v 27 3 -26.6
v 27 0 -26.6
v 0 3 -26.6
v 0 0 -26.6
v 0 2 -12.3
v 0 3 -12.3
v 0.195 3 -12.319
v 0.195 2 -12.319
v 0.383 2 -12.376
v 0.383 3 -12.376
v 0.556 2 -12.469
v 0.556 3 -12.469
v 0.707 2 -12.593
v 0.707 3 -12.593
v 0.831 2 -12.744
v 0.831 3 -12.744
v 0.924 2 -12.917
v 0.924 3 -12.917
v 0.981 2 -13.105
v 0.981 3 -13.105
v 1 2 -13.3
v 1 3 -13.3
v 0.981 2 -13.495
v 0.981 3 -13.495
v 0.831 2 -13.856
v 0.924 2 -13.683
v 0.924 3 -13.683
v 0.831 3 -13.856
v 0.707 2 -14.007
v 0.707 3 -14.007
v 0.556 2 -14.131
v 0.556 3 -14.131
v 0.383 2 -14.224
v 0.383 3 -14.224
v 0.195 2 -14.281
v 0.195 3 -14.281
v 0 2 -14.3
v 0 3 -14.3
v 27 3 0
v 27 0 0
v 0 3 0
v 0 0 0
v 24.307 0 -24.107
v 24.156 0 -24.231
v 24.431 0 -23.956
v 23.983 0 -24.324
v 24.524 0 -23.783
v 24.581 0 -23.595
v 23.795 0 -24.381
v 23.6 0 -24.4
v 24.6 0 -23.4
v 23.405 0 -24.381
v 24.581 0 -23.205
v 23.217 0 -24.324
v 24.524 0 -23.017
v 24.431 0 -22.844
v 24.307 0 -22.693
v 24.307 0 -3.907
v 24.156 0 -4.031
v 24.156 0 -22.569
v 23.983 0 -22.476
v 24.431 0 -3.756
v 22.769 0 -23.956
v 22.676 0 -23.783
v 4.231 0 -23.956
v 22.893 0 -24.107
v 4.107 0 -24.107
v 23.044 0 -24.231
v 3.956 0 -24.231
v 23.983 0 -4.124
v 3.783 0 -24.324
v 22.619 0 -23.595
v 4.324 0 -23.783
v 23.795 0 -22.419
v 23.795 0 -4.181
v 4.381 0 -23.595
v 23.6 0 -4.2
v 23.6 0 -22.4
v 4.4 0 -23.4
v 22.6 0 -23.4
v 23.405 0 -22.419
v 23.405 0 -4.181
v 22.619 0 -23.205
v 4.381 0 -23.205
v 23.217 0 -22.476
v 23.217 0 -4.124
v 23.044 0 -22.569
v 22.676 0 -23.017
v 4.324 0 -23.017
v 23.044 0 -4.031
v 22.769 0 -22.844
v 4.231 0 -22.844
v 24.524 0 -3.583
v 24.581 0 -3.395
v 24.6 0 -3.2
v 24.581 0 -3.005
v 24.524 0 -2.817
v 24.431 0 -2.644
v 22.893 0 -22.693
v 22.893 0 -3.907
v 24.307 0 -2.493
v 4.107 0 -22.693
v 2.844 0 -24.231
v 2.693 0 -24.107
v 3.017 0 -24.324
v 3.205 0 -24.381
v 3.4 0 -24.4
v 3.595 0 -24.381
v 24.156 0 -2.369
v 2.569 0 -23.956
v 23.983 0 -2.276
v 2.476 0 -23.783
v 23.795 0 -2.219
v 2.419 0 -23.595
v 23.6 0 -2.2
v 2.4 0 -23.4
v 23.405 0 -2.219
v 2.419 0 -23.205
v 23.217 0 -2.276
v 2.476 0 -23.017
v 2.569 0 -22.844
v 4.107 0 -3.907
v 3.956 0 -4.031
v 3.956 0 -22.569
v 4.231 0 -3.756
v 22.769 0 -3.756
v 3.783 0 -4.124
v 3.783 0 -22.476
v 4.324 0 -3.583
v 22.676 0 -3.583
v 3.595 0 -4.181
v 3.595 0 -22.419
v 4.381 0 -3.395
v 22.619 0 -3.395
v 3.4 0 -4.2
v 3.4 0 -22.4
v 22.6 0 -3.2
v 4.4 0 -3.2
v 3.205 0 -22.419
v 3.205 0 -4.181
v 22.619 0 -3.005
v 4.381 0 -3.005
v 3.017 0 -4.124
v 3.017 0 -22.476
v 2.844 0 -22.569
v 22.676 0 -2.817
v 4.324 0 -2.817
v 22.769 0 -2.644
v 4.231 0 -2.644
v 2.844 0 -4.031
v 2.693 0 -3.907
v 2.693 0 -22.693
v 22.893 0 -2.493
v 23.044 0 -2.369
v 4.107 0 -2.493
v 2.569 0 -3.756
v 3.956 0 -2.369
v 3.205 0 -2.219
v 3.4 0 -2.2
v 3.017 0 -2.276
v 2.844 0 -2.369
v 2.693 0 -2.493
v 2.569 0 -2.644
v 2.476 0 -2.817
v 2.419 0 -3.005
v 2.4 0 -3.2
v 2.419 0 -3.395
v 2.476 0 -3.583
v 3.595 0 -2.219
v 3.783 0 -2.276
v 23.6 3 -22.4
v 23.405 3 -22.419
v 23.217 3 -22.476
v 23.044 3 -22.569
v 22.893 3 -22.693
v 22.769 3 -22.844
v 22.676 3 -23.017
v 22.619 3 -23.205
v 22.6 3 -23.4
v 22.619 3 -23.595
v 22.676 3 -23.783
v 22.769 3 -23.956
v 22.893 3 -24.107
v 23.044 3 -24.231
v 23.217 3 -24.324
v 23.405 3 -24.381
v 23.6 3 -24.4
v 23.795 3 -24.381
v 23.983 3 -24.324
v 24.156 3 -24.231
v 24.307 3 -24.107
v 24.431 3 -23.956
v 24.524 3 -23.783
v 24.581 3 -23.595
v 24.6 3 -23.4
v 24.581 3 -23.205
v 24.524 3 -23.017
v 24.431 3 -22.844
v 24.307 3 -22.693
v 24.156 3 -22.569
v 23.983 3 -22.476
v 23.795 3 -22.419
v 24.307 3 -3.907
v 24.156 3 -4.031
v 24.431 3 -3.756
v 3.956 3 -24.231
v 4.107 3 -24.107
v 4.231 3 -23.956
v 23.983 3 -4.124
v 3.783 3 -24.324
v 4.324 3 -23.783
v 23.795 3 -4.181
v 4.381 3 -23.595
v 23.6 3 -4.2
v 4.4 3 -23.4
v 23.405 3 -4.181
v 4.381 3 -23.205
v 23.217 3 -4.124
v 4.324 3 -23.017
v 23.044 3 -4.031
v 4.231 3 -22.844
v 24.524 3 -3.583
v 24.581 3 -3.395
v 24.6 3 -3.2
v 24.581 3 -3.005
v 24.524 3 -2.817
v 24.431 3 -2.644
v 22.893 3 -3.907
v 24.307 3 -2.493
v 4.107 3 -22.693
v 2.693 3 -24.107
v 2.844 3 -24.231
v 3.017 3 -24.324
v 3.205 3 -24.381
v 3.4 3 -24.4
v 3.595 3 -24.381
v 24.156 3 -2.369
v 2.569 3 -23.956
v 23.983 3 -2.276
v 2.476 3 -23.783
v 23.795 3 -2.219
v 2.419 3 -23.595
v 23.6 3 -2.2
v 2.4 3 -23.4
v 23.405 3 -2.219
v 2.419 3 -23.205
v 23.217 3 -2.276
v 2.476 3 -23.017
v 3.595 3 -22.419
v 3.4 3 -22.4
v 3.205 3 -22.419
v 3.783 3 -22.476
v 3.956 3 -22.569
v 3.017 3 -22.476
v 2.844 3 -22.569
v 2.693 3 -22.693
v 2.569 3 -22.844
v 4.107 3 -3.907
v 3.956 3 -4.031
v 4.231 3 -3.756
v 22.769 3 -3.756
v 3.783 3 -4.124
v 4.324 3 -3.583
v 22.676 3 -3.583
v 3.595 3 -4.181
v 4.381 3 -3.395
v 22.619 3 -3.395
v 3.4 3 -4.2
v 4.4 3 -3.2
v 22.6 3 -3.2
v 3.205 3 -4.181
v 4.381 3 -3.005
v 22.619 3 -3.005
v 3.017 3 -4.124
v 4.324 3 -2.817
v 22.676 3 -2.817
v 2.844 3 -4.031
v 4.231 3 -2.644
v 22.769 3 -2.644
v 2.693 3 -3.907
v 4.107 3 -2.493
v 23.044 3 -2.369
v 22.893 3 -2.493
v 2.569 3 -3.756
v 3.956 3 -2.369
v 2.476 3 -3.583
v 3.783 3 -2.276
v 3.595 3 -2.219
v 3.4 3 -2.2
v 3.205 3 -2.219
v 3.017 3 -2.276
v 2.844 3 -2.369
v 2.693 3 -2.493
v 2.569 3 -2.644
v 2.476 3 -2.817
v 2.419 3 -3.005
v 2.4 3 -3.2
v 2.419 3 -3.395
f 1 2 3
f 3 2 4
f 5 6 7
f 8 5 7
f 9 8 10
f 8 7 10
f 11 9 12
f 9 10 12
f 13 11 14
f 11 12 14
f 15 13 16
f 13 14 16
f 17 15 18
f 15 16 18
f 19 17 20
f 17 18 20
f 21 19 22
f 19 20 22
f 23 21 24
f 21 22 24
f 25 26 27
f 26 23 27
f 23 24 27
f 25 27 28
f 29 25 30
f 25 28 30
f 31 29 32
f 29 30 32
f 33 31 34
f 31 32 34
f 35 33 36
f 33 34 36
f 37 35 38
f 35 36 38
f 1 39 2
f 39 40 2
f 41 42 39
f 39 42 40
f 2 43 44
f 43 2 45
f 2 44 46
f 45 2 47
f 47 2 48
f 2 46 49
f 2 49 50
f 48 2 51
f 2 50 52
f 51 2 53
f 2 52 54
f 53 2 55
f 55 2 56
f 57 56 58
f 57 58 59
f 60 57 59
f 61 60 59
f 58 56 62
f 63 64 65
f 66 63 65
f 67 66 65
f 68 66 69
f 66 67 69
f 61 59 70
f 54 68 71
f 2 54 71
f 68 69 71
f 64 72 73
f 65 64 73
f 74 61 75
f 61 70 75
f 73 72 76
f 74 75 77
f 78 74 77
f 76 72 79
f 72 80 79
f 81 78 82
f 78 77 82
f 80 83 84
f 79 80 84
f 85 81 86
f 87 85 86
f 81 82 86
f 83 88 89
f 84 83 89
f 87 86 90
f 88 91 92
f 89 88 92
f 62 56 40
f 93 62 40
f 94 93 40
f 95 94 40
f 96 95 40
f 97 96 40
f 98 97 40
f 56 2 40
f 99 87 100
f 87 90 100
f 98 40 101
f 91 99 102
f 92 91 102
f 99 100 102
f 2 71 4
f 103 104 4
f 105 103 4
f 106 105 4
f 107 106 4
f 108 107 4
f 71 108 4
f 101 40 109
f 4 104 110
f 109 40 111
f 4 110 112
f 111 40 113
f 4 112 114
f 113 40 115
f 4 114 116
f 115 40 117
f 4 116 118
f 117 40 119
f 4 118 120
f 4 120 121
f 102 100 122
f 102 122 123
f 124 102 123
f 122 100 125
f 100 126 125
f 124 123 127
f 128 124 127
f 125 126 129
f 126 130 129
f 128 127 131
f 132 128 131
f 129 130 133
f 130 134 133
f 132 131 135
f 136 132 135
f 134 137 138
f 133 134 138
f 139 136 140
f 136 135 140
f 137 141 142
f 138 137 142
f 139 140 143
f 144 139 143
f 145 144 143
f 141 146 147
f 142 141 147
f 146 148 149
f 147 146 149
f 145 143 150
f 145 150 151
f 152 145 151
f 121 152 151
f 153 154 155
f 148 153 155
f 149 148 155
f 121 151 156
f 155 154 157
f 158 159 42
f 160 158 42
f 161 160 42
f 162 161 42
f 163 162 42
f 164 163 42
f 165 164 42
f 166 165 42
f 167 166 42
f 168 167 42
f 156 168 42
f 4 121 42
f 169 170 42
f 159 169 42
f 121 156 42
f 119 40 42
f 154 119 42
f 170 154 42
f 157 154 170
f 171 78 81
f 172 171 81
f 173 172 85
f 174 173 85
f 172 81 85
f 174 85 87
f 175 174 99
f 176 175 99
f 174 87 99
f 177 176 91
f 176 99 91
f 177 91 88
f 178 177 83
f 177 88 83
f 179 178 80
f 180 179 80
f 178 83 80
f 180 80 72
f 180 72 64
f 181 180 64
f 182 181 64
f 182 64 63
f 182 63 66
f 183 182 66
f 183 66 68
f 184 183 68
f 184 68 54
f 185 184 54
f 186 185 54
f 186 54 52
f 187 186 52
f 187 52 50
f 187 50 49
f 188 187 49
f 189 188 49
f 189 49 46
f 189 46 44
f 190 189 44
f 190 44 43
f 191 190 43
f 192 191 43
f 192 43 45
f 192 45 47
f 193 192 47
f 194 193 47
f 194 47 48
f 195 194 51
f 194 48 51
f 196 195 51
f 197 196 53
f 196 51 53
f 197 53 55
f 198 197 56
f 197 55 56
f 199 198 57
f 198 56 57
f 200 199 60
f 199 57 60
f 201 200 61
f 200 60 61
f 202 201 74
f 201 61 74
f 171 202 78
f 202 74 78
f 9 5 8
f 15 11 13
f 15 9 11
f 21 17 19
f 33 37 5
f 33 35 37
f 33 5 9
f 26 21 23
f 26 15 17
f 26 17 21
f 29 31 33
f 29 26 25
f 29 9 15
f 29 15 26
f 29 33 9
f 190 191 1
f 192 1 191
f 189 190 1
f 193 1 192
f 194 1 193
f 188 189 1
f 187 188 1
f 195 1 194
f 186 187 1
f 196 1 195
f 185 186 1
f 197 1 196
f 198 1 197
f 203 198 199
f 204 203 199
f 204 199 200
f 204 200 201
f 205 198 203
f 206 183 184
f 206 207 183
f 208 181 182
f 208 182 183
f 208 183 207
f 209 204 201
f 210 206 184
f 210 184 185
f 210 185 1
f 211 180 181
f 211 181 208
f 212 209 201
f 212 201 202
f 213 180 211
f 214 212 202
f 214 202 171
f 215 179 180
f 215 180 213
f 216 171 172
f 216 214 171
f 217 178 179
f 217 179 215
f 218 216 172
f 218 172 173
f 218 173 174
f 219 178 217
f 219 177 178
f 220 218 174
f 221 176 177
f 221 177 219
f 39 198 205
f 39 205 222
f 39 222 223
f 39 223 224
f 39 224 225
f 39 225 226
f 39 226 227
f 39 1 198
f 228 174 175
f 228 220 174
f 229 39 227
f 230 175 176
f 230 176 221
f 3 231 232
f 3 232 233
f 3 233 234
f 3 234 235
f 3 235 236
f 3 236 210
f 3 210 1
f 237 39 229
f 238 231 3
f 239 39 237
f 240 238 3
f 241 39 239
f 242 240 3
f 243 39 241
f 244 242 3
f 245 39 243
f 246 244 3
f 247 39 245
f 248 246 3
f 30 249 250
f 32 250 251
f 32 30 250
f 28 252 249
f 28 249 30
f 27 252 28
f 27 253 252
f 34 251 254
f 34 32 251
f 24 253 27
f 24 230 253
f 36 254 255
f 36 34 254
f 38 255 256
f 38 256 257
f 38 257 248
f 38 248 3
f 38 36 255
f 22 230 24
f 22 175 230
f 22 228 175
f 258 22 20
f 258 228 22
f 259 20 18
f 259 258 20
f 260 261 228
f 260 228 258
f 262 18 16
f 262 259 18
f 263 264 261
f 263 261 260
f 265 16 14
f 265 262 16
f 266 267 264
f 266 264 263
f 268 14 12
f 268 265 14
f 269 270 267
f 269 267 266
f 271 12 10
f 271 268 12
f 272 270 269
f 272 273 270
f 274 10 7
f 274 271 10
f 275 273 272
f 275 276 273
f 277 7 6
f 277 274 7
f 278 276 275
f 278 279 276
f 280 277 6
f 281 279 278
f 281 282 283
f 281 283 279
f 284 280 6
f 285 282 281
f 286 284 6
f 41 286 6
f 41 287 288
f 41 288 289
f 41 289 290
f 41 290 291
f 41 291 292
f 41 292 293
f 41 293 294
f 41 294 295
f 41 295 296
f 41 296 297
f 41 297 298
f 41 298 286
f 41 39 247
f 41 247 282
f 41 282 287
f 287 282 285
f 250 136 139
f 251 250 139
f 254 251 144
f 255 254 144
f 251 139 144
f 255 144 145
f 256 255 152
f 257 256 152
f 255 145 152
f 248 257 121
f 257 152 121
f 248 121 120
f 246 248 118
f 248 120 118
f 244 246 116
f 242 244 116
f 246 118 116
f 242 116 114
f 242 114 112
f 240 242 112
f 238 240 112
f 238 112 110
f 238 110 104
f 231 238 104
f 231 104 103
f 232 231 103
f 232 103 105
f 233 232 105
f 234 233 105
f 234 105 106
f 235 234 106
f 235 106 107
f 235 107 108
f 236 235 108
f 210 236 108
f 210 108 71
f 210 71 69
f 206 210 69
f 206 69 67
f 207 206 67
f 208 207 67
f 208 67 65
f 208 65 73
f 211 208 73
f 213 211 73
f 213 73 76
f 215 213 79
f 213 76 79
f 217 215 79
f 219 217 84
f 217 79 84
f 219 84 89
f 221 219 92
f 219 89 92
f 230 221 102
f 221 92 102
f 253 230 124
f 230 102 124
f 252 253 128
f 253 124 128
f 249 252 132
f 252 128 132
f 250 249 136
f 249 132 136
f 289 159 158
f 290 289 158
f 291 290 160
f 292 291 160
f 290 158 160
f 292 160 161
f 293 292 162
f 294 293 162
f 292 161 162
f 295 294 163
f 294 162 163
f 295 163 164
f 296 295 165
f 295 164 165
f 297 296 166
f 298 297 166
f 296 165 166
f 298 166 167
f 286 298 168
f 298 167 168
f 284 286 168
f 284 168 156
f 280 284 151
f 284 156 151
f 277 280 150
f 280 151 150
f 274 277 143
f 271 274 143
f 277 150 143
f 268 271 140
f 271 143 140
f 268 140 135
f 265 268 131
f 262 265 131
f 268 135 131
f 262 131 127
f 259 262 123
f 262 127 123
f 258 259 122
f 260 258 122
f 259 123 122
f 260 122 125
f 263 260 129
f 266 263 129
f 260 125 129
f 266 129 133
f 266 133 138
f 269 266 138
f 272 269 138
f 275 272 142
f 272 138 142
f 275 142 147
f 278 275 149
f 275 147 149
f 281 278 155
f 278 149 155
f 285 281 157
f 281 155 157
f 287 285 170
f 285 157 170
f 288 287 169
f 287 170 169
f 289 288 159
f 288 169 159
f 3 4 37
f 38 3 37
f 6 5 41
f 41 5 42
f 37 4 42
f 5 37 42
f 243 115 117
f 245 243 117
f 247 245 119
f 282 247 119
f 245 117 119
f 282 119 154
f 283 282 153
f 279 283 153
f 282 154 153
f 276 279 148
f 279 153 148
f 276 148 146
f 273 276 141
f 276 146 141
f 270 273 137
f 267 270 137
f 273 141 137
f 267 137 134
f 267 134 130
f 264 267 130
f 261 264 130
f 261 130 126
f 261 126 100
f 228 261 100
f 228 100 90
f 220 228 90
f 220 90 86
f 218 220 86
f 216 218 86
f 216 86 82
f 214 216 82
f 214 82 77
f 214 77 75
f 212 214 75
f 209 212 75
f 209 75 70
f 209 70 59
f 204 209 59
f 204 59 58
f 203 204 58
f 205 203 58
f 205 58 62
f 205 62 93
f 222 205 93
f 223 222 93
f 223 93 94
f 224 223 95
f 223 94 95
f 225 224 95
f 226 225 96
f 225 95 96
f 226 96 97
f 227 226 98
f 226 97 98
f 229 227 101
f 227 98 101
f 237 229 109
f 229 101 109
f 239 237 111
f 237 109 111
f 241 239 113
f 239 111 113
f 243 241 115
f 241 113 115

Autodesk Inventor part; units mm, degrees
ref_plane "YZ Plane" through (0, 0, 0) normal (1, 0, 0) x (0, 1, 0)
ref_plane "XZ Plane" through (0, 0, 0) normal (0, 1, 0) x (-1, 0, 0)
ref_plane "XY Plane" through (0, 0, 0) normal (0, 0, 1) x (1, 0, 0)
sketch "Sketch1" plane through (0, 0, 0) normal (0, 1, 0) x (-1, 0, 0)
  line L0 (0, 0) -> (-27, 0)
  line L1 (-27, 0) -> (-27, -26.6)
  line L2 (-27, -26.6) -> (0, -26.6)
  line L3 (0, -26.6) -> (0, 0)
  dimension "d0" = 27
  dimension "d1" = 26.6
extrude "Extrusion1" add sketch "Sketch1" along normal blind 3
sketch "Sketch2" plane through (0, 3, 0) normal (0, 1, 0) x (1, 0, 0)
  line L0 (0, 26.6) -> (0, 0) projected
  circle A0 centre (0, 13.3) radius 1
  dimension "d4" = 2
extrude "Extrusion2" cut sketch "Sketch2" against normal blind 1
sketch "Sketch3" plane through (0, 3, 0) normal (0, 1, 0) x (1, 0, 0)
  point P0 (0, 0)
  point P1 (3.4, 3.2)
  point P2 (23.6, 3.2)
  point P3 (23.6, 23.4)
  point P4 (3.4, 23.4)
hole "Hole1" at (3.4, 3, -3.2) at (23.6, 3, -3.2) at (23.6, 3, -23.4) at (3.4, 3, -23.4) direction (0, -1, 0) diameter 2 end through all
sketch "Sketch4" plane through (0, 3, 0) normal (0, 1, 0) x (1, 0, 0)
  point P0 (0, 0)
properties part number "Top mount"
